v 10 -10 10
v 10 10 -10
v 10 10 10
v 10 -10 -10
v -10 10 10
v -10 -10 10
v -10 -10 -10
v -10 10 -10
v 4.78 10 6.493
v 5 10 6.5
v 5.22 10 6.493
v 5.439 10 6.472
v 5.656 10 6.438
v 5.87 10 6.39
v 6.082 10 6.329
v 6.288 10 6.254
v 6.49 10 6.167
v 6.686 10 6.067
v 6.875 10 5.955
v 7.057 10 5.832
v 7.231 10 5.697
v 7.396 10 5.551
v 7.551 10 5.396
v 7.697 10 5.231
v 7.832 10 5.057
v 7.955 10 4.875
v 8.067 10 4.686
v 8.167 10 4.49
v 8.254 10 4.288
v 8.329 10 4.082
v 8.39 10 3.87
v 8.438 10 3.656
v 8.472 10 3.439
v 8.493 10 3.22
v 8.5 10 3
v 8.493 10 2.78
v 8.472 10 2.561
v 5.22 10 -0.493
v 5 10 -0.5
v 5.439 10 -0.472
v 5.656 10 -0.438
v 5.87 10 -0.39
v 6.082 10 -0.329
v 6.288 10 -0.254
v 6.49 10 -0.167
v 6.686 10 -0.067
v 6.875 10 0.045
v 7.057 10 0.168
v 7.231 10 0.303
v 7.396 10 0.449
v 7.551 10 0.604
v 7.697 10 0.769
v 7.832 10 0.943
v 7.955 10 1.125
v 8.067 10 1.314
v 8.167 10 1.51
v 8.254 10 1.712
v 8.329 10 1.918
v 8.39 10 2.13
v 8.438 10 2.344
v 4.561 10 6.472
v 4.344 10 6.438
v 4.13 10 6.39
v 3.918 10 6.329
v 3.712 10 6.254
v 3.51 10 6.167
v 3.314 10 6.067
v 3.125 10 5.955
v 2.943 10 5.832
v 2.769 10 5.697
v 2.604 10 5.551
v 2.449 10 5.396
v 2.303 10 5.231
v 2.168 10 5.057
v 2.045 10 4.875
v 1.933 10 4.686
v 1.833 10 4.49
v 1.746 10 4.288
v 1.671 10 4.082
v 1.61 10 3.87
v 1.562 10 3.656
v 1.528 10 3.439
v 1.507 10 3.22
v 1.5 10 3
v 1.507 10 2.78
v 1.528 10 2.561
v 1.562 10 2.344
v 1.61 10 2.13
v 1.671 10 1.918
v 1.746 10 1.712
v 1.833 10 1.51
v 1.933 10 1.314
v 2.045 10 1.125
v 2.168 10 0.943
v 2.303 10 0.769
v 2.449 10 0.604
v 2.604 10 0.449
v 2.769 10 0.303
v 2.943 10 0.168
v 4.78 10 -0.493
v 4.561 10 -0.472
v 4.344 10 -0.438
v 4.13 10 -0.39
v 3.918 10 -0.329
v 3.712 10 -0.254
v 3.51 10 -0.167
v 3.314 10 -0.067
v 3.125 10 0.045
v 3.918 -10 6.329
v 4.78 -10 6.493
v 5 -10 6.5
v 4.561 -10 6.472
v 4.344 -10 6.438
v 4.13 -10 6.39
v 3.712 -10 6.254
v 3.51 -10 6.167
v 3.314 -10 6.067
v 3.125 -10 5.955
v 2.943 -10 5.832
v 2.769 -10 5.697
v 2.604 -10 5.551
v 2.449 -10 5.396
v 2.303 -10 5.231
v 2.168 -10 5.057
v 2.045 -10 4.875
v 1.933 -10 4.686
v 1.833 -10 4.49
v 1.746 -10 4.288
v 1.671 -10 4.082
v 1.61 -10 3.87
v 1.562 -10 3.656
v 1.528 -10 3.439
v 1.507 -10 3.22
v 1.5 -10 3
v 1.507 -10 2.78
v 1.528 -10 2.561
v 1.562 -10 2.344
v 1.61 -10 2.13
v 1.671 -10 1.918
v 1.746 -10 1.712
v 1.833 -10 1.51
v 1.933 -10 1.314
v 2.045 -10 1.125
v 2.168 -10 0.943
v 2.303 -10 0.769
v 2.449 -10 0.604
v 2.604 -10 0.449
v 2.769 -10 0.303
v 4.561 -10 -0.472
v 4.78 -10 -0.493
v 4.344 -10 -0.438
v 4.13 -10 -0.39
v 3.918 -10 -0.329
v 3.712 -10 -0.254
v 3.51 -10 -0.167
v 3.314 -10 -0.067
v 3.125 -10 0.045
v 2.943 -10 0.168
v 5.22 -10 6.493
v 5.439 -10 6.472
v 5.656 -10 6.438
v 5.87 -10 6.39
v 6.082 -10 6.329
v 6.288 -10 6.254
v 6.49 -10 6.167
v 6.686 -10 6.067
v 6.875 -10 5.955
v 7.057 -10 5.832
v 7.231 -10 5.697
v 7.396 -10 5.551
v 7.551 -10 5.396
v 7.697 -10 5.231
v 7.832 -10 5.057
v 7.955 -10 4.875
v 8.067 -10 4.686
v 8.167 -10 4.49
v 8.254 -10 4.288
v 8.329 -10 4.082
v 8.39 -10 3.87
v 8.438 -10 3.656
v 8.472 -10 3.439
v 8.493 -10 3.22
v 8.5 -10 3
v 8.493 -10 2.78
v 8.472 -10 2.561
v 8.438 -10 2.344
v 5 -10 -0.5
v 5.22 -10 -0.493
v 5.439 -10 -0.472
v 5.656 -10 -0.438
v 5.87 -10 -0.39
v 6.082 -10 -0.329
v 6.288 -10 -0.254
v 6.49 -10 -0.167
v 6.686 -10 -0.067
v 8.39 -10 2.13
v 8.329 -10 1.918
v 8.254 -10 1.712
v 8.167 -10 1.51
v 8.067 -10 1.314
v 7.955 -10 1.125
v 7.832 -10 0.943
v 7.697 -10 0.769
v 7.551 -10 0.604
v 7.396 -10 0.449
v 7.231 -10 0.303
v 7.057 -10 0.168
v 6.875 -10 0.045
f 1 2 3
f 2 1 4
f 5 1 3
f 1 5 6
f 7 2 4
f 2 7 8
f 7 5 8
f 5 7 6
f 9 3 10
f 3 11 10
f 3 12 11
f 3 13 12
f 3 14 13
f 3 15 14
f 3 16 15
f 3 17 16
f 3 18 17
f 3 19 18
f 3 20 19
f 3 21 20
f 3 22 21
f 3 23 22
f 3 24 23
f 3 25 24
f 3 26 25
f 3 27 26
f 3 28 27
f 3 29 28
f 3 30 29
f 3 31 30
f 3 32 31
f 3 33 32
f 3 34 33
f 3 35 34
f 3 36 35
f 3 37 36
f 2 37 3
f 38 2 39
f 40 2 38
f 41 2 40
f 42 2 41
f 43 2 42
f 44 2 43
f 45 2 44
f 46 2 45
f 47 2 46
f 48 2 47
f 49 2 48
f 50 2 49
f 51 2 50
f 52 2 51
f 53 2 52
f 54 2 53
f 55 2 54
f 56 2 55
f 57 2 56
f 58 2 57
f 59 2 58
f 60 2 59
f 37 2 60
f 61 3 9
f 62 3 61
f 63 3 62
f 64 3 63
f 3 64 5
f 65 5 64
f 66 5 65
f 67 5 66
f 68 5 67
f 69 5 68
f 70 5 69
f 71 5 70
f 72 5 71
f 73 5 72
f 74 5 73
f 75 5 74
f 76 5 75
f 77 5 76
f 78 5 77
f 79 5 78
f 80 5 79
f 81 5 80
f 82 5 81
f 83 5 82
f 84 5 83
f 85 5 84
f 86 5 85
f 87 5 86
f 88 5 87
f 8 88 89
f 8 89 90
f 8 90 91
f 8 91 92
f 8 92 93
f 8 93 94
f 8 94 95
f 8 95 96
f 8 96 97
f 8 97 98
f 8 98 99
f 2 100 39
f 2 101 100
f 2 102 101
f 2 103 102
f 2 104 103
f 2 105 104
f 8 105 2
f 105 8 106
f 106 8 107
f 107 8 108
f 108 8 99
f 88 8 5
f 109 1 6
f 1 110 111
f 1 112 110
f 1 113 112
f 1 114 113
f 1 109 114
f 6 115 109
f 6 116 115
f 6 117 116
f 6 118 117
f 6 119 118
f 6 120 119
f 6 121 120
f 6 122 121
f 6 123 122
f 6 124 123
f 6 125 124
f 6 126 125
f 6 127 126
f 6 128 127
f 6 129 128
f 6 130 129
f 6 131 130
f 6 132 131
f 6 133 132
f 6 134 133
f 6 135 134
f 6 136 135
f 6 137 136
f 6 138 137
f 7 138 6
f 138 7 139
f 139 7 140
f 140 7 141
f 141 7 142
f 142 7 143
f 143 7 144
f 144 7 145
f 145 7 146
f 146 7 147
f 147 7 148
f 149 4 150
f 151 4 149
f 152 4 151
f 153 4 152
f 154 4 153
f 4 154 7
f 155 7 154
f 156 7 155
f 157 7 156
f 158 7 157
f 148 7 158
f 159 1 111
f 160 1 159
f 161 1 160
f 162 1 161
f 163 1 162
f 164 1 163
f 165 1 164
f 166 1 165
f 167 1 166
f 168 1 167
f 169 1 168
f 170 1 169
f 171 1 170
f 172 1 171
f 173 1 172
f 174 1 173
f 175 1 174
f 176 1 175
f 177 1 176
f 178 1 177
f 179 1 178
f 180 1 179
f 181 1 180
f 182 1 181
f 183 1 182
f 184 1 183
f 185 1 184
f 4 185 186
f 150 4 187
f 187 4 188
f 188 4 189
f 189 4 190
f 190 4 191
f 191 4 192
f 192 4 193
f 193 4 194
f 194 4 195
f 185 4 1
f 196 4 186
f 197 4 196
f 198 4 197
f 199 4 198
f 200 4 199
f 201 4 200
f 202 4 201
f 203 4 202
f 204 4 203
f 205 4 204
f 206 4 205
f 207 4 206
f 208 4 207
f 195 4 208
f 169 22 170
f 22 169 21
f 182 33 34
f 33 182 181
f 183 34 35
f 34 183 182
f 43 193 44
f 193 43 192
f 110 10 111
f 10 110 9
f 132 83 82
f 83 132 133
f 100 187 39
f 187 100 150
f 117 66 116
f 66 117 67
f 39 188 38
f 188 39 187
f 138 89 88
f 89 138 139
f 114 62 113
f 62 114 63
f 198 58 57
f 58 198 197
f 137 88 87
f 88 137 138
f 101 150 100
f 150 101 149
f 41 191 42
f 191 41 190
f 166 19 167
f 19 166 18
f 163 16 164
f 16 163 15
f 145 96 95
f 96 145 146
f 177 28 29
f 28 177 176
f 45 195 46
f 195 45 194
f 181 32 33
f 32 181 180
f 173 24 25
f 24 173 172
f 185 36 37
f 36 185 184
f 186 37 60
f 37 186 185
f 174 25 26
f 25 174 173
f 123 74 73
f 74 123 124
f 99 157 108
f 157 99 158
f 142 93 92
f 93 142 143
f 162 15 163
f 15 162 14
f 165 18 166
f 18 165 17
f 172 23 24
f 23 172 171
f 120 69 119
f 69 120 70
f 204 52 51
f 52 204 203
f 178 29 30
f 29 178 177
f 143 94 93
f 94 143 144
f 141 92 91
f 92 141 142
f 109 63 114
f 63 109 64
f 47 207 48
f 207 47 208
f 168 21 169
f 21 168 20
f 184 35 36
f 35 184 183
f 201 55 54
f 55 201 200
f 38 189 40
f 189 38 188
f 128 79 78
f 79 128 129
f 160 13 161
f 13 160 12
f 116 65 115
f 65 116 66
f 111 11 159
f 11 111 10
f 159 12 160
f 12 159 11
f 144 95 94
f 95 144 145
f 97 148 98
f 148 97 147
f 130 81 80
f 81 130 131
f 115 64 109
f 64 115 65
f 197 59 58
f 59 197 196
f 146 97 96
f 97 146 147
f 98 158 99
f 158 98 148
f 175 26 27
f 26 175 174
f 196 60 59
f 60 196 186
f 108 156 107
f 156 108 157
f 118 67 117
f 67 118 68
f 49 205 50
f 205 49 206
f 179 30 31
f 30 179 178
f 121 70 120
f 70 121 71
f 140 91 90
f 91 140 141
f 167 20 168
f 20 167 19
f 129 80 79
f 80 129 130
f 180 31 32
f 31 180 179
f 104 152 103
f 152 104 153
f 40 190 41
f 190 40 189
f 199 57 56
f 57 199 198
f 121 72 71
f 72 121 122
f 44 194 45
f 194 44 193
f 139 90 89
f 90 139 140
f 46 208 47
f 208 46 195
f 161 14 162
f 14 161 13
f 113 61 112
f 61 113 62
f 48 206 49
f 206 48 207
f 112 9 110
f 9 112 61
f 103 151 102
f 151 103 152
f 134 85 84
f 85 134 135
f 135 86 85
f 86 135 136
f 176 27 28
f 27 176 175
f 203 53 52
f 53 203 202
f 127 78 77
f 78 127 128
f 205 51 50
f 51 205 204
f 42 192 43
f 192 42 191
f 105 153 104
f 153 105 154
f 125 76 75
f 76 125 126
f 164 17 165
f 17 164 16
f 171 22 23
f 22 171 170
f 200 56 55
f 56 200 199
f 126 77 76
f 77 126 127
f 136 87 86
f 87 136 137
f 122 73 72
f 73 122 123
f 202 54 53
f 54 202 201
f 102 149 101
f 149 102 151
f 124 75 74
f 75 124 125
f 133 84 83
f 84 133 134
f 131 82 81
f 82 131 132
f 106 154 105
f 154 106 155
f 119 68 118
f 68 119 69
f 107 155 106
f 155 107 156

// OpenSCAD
$fn = 100; // set cylinder resolution globally

// Cube with a hole along the Y-axis, cylinder shifted directly in translate
cube_size = 20;
hole_diameter = 7;

// Subtract cylindrical hole
difference() {
    cube(cube_size, center=true);
    translate([5, 0, 3])  // X=5, Y=0, Z=3
        rotate([90,0,0])  // align cylinder along Y-axis
        cylinder(d=hole_diameter, h=cube_size + 1, center=true);
}
